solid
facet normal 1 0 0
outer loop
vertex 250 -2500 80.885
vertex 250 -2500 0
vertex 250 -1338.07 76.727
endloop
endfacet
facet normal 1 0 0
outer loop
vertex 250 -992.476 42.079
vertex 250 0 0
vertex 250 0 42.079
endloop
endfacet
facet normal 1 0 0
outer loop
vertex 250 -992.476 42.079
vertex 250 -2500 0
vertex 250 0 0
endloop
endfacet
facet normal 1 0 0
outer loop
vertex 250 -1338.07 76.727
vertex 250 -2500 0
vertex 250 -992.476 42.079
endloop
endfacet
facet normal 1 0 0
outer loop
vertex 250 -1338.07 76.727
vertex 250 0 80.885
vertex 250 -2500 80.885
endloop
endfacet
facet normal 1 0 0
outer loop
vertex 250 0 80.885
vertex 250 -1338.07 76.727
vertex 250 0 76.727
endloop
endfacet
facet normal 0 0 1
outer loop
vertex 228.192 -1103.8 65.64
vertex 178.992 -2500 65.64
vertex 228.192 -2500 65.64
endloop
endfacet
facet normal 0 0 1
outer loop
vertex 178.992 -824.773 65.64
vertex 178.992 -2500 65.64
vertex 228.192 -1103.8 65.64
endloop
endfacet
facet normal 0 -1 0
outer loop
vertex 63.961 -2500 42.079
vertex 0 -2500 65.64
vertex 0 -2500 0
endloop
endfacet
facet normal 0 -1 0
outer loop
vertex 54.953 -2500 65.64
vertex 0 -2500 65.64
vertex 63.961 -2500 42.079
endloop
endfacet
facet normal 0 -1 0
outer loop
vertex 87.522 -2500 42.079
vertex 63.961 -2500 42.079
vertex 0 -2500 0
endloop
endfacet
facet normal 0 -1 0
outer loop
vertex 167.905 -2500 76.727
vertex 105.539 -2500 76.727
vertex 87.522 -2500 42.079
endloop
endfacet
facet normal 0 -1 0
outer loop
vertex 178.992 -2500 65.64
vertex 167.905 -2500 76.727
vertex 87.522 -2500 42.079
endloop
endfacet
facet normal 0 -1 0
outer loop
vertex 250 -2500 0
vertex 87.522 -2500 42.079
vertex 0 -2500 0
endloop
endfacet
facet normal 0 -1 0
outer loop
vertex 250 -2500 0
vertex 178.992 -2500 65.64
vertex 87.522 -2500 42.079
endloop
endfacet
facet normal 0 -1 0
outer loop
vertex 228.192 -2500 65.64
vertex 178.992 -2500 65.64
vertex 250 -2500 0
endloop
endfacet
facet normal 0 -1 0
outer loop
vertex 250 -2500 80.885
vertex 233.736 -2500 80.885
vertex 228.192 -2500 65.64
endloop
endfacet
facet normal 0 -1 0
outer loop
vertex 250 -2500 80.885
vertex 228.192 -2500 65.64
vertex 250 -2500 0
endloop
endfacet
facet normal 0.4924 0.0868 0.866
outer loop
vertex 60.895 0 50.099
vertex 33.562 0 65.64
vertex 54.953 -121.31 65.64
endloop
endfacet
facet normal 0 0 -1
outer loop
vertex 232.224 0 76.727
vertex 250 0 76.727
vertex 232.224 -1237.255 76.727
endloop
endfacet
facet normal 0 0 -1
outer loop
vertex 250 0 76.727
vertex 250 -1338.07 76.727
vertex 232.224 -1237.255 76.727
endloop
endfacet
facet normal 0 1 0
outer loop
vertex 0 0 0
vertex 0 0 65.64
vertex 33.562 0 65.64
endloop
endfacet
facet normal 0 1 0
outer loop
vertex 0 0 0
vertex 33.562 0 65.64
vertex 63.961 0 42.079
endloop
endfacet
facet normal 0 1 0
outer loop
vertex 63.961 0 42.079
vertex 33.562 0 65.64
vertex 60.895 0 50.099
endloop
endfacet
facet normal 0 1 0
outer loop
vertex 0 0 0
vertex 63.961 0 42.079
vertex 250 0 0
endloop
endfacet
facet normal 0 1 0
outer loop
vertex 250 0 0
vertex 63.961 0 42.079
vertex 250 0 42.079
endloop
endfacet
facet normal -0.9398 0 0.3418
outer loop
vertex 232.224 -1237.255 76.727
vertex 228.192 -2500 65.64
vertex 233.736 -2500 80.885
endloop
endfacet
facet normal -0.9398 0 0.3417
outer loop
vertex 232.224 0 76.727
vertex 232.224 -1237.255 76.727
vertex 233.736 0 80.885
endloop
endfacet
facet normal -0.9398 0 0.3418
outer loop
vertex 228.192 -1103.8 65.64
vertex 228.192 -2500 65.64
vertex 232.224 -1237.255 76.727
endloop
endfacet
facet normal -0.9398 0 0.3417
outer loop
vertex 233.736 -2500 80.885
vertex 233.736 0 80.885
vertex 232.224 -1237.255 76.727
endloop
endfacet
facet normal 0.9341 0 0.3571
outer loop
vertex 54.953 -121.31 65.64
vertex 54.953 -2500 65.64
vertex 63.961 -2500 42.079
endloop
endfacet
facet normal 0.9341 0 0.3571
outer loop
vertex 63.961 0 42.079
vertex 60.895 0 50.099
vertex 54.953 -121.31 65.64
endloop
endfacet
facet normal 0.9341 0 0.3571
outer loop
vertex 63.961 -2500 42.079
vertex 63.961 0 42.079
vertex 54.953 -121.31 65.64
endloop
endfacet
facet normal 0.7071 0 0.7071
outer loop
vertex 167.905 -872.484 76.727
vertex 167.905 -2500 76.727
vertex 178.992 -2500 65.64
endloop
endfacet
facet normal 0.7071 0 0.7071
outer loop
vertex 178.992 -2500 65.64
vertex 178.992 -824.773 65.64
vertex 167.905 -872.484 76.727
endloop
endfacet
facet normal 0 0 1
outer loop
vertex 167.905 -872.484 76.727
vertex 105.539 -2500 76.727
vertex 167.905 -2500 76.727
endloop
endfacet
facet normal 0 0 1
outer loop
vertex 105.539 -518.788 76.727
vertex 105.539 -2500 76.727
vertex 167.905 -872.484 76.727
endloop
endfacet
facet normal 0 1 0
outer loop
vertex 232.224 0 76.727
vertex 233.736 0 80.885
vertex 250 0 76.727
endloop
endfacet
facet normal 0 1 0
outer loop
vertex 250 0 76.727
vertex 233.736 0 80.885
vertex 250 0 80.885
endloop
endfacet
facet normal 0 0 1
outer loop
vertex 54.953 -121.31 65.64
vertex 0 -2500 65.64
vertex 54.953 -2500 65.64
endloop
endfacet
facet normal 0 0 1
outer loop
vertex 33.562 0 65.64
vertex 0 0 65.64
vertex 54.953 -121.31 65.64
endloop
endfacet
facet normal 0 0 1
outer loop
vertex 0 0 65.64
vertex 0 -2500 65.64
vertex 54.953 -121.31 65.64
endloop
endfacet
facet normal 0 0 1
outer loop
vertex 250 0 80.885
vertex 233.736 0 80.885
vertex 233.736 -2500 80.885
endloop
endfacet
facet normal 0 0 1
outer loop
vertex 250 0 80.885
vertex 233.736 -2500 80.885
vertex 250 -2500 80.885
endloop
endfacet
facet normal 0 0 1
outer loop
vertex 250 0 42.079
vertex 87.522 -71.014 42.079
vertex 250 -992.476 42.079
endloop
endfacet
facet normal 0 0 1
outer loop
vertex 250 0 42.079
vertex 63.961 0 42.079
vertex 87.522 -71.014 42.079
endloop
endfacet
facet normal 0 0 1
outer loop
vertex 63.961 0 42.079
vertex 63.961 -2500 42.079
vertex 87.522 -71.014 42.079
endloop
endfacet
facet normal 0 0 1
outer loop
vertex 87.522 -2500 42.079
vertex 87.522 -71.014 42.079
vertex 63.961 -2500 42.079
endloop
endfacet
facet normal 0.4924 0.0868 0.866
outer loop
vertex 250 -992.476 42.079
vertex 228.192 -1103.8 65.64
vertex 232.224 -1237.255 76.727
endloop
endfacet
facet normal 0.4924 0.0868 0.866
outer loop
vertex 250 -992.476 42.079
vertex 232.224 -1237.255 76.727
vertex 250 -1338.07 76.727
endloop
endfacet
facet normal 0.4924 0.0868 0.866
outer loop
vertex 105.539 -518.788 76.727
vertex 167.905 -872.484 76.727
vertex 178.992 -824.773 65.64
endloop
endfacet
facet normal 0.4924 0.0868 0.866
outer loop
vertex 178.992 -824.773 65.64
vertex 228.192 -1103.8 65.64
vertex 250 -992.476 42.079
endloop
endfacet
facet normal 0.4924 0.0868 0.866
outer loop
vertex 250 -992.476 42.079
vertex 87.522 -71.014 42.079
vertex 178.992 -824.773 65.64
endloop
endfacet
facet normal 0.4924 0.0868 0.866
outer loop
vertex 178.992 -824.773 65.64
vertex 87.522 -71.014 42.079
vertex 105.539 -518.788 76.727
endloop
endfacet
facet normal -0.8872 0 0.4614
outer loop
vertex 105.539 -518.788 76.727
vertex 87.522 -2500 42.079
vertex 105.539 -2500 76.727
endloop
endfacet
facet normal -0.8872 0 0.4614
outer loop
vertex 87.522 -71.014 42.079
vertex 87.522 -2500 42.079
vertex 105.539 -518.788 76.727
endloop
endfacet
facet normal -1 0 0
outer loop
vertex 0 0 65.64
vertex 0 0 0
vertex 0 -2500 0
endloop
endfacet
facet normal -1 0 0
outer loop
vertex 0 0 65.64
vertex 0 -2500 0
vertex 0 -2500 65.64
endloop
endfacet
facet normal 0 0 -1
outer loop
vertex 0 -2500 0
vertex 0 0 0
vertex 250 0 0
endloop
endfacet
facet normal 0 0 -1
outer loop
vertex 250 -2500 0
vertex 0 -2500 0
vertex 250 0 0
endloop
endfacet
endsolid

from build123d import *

# Parameters (mm, degrees)
F0_W          = 250
F0_H          = 88
F1_DEPTH      = 2500
F3_DEPTH      = 2500.001
F7_DEPTH      = 2492.408814
F7_DEPTH_BACK = 25


with BuildPart() as f1:
    # F0 (on Front) → F1 (new body)
    with BuildSketch(Plane.XZ):
        with Locations((125, 44)):
            Rectangle(F0_W, F0_H)
    extrude(amount=F1_DEPTH)

    # F2 (on Front) → F3 (cut, through all)
    with BuildSketch(Plane.XZ):
        Polygon((-6.027462, 133.504351), (-6.027462, 65.639846), (54.952722, 65.639846), (63.961156, 42.079318), (87.521672, 42.079318), (105.538554, 76.727152), (167.904645, 76.727152), (178.991958, 65.639846), (228.191867, 65.639846), (233.735517, 80.884889), (266.304493, 80.884889), (266.304493, 133.504351), align=None)
    extrude(amount=F3_DEPTH, mode=Mode.SUBTRACT)

    # F6 (on face) → F7 (cut, two sides)
    with BuildSketch(Plane(origin=(2.261527, -12.825755, 0), x_dir=(0.984808, 0.173648, 0), z_dir=(0.173648, -0.984808, 0))) as f7_sk:
        Polygon((13.848773, 76.727152), (73.860581, 42.079318), (295.860581, 42.079318), (295.860581, 76.727152), align=None)
    extrude(amount=F7_DEPTH, mode=Mode.SUBTRACT)
    extrude(f7_sk.sketch, amount=-F7_DEPTH_BACK, mode=Mode.SUBTRACT)


solid = f1.part
